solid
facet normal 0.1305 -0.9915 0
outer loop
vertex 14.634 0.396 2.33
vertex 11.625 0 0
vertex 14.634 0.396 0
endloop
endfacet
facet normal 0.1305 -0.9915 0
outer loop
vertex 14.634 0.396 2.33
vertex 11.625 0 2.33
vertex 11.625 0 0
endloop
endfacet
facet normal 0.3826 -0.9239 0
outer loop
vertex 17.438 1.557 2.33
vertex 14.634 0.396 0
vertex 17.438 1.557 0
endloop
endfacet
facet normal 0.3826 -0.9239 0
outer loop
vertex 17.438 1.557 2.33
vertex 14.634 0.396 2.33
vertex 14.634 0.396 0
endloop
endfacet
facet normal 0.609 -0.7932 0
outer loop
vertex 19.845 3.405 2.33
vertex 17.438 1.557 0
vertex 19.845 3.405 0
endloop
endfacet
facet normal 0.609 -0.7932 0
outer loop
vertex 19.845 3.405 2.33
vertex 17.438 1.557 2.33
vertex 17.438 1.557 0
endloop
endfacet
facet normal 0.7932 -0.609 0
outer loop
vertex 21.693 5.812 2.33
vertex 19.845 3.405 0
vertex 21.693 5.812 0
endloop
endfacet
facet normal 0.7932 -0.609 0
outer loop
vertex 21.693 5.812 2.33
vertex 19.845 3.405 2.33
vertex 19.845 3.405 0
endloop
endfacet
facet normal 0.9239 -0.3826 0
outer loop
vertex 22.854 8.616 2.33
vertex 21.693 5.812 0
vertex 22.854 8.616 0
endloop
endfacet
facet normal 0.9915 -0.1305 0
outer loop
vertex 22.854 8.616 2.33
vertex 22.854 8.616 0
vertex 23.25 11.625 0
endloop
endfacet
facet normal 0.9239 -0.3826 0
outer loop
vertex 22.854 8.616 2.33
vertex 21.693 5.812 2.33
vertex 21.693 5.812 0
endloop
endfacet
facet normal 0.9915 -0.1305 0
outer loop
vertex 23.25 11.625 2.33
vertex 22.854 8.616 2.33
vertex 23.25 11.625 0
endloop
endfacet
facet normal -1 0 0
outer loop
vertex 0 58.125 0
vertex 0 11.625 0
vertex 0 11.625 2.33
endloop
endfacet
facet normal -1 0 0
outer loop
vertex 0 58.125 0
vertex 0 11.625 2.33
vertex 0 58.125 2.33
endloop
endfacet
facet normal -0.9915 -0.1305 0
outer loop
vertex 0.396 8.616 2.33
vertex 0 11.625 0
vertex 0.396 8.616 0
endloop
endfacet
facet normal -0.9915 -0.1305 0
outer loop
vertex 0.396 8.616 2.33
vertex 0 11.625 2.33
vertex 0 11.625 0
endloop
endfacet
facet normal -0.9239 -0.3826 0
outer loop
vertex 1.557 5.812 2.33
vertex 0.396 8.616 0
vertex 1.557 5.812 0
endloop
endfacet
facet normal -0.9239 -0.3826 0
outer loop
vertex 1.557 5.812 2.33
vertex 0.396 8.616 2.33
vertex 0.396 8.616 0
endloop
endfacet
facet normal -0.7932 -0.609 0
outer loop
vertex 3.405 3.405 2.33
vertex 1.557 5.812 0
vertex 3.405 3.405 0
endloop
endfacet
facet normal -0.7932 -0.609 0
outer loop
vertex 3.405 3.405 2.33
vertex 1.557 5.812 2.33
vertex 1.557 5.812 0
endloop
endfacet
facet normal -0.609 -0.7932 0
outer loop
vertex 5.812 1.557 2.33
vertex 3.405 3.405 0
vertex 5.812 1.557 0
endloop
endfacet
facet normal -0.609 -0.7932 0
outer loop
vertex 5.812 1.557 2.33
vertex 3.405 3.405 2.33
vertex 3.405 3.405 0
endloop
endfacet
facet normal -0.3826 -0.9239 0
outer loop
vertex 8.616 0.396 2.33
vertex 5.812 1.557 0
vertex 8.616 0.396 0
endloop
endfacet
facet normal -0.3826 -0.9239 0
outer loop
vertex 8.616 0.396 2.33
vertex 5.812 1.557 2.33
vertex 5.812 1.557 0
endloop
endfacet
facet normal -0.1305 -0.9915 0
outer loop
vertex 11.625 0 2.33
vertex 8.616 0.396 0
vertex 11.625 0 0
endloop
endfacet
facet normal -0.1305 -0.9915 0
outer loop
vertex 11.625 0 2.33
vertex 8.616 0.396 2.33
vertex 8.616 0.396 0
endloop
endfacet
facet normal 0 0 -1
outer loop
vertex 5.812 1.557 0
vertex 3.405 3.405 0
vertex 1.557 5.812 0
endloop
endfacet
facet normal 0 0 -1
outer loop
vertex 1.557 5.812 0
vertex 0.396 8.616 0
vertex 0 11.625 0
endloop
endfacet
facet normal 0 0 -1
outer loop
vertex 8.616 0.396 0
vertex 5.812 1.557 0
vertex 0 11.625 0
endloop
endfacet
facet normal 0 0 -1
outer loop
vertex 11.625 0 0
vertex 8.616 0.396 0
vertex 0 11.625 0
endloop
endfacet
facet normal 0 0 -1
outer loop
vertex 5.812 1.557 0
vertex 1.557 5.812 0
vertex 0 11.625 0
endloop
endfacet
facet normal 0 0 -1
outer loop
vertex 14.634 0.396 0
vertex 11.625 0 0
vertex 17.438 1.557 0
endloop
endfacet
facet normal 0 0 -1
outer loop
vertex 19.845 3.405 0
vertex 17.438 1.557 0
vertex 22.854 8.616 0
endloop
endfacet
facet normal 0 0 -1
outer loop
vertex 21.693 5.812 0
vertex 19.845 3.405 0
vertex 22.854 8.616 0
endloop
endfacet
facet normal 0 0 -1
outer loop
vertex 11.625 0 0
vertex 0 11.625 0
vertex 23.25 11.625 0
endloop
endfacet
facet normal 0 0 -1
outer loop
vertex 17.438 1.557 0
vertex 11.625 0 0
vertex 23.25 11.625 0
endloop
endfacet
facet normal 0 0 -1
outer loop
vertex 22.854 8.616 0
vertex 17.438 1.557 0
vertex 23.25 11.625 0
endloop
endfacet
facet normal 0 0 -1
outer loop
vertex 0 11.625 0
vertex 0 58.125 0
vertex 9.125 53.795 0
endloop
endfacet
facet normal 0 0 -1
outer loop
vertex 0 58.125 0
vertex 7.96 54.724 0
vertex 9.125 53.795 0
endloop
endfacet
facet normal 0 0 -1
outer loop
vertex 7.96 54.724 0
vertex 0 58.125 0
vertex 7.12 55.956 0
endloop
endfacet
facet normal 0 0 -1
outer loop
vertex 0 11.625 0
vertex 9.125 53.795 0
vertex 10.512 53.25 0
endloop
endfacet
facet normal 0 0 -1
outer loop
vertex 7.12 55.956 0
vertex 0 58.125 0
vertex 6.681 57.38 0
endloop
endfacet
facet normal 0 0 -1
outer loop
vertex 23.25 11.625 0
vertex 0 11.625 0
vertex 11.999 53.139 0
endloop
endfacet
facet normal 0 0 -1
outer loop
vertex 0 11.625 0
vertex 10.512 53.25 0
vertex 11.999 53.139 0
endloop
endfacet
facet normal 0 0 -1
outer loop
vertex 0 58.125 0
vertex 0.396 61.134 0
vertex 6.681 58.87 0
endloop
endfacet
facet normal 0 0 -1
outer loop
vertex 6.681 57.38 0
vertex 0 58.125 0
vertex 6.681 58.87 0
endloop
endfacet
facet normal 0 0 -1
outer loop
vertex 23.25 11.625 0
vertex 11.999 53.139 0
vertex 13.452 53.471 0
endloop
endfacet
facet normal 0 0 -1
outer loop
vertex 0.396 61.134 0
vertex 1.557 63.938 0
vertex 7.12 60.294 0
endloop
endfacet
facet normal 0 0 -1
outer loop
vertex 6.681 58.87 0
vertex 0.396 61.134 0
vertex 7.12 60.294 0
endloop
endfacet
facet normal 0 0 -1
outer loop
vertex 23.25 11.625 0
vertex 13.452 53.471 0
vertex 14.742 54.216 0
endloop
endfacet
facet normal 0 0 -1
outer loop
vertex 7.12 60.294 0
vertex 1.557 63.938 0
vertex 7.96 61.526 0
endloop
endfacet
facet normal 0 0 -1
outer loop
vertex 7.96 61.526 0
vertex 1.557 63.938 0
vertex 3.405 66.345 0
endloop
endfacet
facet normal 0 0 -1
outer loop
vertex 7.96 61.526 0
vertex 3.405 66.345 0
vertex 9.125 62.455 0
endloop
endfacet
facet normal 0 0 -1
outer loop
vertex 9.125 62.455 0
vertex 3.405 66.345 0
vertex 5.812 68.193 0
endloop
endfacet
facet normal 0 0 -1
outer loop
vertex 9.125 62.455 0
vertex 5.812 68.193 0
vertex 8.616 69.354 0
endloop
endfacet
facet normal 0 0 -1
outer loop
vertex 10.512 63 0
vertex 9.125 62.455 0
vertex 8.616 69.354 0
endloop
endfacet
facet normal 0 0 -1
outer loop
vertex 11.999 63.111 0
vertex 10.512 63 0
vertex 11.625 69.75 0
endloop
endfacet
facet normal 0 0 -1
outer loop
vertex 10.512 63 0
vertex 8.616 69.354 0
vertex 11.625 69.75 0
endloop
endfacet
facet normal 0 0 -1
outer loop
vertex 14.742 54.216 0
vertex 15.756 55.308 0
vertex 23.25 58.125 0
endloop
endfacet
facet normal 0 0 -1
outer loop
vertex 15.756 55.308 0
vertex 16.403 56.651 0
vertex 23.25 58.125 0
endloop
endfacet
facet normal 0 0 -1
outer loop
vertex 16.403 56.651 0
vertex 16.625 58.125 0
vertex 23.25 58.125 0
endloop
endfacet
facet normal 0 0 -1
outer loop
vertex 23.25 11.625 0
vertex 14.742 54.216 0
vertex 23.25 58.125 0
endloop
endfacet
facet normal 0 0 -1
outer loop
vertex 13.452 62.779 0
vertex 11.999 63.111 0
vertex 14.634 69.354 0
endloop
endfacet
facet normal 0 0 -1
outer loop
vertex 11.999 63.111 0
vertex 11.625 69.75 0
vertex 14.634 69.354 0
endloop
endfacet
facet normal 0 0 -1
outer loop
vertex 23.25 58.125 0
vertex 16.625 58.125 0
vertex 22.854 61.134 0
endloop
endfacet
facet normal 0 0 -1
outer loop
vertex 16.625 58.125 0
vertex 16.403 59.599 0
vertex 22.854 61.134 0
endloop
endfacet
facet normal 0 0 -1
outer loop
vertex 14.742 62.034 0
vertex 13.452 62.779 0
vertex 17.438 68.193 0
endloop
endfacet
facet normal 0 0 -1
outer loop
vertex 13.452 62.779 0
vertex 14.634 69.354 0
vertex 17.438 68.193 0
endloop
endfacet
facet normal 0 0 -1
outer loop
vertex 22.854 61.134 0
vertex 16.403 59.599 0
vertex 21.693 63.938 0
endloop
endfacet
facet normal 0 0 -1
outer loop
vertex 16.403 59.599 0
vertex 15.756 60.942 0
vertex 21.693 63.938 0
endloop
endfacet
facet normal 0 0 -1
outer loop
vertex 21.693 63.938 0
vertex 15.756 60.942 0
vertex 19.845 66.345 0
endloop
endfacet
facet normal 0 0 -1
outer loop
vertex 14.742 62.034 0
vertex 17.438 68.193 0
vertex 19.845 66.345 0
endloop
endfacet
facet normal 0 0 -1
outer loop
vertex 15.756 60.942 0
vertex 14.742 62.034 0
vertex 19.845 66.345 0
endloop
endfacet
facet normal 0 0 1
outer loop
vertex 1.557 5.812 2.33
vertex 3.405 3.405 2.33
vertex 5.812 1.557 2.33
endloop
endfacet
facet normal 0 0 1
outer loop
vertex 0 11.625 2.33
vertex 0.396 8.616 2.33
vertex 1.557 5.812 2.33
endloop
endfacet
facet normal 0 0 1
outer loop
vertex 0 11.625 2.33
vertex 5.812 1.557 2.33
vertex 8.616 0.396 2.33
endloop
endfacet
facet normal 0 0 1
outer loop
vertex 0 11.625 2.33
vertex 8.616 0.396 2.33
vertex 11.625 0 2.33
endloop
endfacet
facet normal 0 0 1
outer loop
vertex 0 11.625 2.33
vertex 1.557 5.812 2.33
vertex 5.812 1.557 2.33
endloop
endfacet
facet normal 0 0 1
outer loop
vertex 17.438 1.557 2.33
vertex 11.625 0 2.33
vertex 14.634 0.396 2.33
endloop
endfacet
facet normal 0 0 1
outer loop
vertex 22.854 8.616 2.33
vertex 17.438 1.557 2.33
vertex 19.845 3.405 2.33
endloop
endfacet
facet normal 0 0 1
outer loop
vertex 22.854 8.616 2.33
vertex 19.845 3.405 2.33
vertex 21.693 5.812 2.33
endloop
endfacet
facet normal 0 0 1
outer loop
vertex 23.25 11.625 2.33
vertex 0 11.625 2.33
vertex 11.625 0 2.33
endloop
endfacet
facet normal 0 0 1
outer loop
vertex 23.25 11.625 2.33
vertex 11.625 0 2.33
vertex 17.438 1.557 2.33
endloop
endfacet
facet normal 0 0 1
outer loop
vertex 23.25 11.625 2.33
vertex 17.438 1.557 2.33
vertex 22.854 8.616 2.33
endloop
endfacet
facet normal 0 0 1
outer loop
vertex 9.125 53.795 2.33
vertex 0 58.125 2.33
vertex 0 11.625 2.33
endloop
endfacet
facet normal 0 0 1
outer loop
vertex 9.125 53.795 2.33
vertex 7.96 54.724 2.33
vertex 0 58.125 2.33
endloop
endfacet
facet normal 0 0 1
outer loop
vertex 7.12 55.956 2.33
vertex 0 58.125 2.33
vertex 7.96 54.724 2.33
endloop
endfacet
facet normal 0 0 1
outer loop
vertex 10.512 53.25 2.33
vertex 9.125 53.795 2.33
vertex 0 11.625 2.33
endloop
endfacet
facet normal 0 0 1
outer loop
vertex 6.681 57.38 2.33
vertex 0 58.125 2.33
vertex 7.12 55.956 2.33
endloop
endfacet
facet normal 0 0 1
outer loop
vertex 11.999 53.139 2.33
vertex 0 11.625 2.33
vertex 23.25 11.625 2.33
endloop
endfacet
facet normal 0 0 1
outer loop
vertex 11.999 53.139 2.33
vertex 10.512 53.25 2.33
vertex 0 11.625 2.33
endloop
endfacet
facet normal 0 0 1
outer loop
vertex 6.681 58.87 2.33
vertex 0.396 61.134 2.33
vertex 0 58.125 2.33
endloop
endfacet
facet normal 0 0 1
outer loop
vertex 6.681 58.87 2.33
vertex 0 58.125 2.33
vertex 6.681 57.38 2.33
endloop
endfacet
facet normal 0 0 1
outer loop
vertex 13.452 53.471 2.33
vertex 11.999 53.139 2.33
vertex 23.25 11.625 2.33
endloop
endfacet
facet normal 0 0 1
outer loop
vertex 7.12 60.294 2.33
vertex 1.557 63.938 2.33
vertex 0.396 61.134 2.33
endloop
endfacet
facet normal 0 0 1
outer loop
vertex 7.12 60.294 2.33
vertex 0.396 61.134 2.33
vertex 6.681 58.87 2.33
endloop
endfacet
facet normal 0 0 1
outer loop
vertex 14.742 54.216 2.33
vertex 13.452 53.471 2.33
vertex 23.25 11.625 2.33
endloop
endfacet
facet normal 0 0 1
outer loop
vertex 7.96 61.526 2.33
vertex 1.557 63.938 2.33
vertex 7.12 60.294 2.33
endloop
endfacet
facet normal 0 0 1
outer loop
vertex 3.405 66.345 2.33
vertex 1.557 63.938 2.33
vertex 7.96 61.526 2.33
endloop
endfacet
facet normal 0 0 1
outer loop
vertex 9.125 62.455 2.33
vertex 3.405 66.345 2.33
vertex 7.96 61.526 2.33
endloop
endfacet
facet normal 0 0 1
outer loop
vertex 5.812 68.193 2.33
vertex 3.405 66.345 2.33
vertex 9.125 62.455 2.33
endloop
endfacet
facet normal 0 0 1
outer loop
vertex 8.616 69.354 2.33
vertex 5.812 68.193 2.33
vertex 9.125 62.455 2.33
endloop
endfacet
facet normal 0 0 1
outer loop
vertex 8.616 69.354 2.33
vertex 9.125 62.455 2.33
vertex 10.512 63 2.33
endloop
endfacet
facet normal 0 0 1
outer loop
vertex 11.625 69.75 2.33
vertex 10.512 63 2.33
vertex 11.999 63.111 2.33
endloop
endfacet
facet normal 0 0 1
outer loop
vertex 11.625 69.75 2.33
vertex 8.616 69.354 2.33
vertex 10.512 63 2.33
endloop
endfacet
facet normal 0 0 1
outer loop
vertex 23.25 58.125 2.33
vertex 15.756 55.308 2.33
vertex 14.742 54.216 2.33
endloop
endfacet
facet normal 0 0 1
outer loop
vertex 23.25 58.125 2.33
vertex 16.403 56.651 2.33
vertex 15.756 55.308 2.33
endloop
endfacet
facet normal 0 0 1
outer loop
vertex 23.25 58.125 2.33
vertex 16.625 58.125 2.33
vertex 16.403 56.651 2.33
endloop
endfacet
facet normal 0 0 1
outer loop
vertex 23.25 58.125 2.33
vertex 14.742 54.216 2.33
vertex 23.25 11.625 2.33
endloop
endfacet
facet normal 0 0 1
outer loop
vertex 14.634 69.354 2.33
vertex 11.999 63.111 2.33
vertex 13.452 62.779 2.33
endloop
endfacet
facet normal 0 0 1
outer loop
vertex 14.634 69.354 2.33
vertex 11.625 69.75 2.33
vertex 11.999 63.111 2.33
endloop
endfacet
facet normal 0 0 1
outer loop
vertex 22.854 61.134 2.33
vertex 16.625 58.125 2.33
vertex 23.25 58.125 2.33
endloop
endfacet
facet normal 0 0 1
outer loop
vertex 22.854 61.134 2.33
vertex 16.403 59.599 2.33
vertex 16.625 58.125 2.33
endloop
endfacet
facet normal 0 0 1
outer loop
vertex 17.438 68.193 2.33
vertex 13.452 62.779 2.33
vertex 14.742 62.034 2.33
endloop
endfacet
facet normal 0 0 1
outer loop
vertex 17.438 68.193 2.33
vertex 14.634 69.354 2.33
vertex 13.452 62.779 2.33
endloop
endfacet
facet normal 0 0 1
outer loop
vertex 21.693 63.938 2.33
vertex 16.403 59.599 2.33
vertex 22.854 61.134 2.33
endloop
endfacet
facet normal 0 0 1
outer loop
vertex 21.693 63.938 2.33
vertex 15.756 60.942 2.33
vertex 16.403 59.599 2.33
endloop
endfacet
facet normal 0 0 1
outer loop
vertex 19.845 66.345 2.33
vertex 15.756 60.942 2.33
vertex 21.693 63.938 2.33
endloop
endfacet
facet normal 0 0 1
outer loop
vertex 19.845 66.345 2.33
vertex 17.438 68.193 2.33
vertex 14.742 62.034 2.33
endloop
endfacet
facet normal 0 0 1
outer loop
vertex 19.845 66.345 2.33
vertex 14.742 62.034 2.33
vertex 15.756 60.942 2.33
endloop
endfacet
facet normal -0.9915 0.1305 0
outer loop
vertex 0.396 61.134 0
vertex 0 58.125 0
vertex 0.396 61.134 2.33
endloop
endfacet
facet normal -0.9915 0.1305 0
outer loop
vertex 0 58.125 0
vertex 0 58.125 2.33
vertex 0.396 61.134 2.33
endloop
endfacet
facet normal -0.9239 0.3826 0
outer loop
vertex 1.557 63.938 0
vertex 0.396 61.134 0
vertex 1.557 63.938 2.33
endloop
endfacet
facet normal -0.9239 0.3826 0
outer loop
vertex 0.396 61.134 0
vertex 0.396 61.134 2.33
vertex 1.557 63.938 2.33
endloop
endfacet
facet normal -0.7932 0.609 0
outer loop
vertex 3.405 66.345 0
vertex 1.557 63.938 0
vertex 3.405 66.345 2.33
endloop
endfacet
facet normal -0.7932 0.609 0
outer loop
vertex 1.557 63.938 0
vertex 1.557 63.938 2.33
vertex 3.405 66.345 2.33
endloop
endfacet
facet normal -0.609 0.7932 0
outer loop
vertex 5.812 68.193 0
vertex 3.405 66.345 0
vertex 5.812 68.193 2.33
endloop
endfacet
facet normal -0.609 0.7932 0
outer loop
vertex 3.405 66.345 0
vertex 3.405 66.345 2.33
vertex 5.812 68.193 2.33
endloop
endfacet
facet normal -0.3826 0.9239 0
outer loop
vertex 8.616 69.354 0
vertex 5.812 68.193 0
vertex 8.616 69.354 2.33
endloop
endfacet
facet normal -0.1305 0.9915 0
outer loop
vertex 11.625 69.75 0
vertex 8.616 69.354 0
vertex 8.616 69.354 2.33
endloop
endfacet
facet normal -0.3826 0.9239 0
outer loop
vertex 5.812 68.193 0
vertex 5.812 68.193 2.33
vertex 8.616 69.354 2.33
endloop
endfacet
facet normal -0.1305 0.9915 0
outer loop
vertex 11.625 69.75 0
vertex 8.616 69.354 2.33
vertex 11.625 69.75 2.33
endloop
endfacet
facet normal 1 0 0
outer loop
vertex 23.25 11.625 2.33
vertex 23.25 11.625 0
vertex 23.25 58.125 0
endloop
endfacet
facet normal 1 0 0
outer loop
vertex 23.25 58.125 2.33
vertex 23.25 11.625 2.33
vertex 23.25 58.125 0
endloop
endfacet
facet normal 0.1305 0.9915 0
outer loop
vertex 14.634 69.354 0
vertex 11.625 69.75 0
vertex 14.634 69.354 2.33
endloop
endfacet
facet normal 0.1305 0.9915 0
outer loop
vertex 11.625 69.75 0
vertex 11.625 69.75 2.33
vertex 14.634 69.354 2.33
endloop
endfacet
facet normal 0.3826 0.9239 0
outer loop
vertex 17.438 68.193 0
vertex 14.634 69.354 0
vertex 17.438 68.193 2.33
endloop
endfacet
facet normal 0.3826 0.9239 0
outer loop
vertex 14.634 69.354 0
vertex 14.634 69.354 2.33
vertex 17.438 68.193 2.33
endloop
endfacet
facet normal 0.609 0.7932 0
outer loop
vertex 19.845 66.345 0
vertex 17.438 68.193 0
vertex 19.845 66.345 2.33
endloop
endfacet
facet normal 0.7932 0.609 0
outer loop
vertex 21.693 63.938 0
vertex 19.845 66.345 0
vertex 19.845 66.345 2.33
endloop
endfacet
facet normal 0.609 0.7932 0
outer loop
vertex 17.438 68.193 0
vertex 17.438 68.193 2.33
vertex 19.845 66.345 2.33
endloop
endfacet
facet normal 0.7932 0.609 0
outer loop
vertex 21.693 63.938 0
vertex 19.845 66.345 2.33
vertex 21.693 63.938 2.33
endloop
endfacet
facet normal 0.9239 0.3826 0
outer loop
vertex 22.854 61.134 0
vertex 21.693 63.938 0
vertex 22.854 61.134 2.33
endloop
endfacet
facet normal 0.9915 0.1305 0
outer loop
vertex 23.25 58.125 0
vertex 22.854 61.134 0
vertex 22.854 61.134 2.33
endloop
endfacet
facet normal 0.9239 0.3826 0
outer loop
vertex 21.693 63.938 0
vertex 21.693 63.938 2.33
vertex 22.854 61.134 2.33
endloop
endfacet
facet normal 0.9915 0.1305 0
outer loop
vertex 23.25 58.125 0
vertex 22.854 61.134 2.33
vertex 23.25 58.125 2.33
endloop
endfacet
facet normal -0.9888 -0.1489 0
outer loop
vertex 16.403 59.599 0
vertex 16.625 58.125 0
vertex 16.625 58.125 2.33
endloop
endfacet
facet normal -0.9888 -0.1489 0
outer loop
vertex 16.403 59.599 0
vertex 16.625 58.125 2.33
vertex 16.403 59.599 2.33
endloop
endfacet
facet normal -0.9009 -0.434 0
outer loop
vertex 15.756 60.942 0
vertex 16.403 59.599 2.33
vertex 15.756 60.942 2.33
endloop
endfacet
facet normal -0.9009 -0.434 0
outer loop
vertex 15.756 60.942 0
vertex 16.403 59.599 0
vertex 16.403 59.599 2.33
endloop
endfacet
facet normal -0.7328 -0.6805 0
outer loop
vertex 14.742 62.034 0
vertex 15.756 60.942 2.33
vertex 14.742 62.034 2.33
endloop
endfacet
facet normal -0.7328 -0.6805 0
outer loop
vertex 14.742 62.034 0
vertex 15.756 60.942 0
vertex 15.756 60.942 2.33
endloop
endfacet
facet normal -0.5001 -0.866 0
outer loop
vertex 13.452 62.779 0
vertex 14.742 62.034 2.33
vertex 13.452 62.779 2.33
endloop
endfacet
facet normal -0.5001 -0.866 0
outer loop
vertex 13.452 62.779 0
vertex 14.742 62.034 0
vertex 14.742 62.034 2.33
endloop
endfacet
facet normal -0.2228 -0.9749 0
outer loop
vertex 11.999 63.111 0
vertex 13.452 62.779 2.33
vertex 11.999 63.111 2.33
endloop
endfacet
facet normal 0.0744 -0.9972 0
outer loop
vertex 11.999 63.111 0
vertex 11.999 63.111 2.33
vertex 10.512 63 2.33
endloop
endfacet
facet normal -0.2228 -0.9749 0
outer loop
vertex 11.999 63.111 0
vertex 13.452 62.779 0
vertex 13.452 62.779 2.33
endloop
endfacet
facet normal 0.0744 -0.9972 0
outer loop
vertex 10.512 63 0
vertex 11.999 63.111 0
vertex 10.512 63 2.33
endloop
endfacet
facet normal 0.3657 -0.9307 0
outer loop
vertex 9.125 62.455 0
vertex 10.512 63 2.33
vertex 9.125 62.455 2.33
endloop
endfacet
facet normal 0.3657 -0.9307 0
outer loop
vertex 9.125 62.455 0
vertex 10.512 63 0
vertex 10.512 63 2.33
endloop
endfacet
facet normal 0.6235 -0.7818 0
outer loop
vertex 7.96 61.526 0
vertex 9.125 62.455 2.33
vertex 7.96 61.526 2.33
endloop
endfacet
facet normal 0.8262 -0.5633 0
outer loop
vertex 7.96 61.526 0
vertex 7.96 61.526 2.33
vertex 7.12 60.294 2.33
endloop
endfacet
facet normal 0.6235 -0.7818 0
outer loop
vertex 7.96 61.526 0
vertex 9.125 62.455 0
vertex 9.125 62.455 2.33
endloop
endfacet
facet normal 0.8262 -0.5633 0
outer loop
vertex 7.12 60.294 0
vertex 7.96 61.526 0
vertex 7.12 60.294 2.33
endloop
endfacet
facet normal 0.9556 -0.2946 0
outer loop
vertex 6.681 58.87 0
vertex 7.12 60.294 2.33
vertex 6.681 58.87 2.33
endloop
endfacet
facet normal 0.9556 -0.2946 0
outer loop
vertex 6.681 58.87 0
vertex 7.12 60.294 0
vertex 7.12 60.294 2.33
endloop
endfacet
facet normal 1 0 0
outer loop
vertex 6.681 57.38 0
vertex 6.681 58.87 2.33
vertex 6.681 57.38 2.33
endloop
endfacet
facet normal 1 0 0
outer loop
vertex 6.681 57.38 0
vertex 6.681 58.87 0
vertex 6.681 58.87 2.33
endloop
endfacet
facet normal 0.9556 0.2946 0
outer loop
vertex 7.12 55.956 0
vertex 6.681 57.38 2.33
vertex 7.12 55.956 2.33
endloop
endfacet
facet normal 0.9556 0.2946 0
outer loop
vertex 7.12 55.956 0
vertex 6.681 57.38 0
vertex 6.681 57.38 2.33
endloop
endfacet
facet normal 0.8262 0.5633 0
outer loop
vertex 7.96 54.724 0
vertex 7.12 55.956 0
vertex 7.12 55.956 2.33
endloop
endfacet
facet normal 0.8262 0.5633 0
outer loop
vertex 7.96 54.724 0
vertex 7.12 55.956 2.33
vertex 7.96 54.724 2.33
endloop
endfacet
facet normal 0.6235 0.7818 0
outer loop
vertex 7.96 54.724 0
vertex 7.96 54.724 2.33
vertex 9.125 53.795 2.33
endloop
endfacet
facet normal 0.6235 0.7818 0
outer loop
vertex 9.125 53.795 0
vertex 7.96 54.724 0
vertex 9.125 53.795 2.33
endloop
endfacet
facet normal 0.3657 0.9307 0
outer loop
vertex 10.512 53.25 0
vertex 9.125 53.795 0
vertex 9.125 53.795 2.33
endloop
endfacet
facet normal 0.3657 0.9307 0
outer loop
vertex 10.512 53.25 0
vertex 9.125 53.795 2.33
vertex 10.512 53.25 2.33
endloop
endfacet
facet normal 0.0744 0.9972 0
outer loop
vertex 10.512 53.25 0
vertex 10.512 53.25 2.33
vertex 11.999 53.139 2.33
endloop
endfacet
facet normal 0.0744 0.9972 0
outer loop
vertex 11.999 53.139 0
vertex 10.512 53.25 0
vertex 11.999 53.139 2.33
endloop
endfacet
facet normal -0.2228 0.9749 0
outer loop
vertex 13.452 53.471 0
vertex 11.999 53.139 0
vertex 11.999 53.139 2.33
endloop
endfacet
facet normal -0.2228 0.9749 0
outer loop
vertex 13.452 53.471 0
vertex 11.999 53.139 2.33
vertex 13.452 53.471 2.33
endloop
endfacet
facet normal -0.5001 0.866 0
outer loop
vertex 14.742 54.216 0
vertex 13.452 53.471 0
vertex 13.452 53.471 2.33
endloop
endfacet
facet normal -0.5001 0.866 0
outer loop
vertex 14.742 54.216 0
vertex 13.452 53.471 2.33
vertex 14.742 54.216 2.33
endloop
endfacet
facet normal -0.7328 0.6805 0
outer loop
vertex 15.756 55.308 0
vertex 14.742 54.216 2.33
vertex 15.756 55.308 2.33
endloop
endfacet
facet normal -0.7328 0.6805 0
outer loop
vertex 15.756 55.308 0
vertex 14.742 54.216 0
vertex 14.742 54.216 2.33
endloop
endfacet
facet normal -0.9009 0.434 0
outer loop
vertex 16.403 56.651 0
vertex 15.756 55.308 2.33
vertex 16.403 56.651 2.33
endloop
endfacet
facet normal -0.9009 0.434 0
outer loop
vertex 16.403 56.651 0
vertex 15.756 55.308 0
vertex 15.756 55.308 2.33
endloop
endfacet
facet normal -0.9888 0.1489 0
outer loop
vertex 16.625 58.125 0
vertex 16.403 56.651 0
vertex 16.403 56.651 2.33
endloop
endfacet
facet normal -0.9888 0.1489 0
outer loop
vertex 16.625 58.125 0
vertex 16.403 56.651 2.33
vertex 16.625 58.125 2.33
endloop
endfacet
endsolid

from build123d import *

# Parameters (mm, degrees)
F0_W     = 23.25
F0_H     = 69.75
F0_R     = 5
F1_DEPTH = 2.33
F2_R     = 11.62499


# Not quite as in the source:
# - a fillet or chamfer is up to 0.001 mm smaller than in the source, because OpenCascade refuses the exact size


with BuildPart() as f1:
    # F0 (on Top) → F1 (new body)
    with BuildSketch(Plane.XY):
        with Locations((11.625, 34.875)):
            Rectangle(F0_W, F0_H)
        with Locations((11.625, 58.125)):
            Circle(F0_R, mode=Mode.SUBTRACT)
    extrude(amount=F1_DEPTH)

    # F2 (radius 11.625 in the source; OpenCascade refuses exactly that, so slightly less here)
    f2_edges = [f1.edges().sort_by_distance(p)[0] for p in [
        (23.25, 0, 1.165),
        (0, 0, 1.165),
        (0, 69.75, 1.165),
        (23.25, 69.75, 1.165),
    ]]
    fillet(f2_edges, radius=F2_R)


solid = f1.part
